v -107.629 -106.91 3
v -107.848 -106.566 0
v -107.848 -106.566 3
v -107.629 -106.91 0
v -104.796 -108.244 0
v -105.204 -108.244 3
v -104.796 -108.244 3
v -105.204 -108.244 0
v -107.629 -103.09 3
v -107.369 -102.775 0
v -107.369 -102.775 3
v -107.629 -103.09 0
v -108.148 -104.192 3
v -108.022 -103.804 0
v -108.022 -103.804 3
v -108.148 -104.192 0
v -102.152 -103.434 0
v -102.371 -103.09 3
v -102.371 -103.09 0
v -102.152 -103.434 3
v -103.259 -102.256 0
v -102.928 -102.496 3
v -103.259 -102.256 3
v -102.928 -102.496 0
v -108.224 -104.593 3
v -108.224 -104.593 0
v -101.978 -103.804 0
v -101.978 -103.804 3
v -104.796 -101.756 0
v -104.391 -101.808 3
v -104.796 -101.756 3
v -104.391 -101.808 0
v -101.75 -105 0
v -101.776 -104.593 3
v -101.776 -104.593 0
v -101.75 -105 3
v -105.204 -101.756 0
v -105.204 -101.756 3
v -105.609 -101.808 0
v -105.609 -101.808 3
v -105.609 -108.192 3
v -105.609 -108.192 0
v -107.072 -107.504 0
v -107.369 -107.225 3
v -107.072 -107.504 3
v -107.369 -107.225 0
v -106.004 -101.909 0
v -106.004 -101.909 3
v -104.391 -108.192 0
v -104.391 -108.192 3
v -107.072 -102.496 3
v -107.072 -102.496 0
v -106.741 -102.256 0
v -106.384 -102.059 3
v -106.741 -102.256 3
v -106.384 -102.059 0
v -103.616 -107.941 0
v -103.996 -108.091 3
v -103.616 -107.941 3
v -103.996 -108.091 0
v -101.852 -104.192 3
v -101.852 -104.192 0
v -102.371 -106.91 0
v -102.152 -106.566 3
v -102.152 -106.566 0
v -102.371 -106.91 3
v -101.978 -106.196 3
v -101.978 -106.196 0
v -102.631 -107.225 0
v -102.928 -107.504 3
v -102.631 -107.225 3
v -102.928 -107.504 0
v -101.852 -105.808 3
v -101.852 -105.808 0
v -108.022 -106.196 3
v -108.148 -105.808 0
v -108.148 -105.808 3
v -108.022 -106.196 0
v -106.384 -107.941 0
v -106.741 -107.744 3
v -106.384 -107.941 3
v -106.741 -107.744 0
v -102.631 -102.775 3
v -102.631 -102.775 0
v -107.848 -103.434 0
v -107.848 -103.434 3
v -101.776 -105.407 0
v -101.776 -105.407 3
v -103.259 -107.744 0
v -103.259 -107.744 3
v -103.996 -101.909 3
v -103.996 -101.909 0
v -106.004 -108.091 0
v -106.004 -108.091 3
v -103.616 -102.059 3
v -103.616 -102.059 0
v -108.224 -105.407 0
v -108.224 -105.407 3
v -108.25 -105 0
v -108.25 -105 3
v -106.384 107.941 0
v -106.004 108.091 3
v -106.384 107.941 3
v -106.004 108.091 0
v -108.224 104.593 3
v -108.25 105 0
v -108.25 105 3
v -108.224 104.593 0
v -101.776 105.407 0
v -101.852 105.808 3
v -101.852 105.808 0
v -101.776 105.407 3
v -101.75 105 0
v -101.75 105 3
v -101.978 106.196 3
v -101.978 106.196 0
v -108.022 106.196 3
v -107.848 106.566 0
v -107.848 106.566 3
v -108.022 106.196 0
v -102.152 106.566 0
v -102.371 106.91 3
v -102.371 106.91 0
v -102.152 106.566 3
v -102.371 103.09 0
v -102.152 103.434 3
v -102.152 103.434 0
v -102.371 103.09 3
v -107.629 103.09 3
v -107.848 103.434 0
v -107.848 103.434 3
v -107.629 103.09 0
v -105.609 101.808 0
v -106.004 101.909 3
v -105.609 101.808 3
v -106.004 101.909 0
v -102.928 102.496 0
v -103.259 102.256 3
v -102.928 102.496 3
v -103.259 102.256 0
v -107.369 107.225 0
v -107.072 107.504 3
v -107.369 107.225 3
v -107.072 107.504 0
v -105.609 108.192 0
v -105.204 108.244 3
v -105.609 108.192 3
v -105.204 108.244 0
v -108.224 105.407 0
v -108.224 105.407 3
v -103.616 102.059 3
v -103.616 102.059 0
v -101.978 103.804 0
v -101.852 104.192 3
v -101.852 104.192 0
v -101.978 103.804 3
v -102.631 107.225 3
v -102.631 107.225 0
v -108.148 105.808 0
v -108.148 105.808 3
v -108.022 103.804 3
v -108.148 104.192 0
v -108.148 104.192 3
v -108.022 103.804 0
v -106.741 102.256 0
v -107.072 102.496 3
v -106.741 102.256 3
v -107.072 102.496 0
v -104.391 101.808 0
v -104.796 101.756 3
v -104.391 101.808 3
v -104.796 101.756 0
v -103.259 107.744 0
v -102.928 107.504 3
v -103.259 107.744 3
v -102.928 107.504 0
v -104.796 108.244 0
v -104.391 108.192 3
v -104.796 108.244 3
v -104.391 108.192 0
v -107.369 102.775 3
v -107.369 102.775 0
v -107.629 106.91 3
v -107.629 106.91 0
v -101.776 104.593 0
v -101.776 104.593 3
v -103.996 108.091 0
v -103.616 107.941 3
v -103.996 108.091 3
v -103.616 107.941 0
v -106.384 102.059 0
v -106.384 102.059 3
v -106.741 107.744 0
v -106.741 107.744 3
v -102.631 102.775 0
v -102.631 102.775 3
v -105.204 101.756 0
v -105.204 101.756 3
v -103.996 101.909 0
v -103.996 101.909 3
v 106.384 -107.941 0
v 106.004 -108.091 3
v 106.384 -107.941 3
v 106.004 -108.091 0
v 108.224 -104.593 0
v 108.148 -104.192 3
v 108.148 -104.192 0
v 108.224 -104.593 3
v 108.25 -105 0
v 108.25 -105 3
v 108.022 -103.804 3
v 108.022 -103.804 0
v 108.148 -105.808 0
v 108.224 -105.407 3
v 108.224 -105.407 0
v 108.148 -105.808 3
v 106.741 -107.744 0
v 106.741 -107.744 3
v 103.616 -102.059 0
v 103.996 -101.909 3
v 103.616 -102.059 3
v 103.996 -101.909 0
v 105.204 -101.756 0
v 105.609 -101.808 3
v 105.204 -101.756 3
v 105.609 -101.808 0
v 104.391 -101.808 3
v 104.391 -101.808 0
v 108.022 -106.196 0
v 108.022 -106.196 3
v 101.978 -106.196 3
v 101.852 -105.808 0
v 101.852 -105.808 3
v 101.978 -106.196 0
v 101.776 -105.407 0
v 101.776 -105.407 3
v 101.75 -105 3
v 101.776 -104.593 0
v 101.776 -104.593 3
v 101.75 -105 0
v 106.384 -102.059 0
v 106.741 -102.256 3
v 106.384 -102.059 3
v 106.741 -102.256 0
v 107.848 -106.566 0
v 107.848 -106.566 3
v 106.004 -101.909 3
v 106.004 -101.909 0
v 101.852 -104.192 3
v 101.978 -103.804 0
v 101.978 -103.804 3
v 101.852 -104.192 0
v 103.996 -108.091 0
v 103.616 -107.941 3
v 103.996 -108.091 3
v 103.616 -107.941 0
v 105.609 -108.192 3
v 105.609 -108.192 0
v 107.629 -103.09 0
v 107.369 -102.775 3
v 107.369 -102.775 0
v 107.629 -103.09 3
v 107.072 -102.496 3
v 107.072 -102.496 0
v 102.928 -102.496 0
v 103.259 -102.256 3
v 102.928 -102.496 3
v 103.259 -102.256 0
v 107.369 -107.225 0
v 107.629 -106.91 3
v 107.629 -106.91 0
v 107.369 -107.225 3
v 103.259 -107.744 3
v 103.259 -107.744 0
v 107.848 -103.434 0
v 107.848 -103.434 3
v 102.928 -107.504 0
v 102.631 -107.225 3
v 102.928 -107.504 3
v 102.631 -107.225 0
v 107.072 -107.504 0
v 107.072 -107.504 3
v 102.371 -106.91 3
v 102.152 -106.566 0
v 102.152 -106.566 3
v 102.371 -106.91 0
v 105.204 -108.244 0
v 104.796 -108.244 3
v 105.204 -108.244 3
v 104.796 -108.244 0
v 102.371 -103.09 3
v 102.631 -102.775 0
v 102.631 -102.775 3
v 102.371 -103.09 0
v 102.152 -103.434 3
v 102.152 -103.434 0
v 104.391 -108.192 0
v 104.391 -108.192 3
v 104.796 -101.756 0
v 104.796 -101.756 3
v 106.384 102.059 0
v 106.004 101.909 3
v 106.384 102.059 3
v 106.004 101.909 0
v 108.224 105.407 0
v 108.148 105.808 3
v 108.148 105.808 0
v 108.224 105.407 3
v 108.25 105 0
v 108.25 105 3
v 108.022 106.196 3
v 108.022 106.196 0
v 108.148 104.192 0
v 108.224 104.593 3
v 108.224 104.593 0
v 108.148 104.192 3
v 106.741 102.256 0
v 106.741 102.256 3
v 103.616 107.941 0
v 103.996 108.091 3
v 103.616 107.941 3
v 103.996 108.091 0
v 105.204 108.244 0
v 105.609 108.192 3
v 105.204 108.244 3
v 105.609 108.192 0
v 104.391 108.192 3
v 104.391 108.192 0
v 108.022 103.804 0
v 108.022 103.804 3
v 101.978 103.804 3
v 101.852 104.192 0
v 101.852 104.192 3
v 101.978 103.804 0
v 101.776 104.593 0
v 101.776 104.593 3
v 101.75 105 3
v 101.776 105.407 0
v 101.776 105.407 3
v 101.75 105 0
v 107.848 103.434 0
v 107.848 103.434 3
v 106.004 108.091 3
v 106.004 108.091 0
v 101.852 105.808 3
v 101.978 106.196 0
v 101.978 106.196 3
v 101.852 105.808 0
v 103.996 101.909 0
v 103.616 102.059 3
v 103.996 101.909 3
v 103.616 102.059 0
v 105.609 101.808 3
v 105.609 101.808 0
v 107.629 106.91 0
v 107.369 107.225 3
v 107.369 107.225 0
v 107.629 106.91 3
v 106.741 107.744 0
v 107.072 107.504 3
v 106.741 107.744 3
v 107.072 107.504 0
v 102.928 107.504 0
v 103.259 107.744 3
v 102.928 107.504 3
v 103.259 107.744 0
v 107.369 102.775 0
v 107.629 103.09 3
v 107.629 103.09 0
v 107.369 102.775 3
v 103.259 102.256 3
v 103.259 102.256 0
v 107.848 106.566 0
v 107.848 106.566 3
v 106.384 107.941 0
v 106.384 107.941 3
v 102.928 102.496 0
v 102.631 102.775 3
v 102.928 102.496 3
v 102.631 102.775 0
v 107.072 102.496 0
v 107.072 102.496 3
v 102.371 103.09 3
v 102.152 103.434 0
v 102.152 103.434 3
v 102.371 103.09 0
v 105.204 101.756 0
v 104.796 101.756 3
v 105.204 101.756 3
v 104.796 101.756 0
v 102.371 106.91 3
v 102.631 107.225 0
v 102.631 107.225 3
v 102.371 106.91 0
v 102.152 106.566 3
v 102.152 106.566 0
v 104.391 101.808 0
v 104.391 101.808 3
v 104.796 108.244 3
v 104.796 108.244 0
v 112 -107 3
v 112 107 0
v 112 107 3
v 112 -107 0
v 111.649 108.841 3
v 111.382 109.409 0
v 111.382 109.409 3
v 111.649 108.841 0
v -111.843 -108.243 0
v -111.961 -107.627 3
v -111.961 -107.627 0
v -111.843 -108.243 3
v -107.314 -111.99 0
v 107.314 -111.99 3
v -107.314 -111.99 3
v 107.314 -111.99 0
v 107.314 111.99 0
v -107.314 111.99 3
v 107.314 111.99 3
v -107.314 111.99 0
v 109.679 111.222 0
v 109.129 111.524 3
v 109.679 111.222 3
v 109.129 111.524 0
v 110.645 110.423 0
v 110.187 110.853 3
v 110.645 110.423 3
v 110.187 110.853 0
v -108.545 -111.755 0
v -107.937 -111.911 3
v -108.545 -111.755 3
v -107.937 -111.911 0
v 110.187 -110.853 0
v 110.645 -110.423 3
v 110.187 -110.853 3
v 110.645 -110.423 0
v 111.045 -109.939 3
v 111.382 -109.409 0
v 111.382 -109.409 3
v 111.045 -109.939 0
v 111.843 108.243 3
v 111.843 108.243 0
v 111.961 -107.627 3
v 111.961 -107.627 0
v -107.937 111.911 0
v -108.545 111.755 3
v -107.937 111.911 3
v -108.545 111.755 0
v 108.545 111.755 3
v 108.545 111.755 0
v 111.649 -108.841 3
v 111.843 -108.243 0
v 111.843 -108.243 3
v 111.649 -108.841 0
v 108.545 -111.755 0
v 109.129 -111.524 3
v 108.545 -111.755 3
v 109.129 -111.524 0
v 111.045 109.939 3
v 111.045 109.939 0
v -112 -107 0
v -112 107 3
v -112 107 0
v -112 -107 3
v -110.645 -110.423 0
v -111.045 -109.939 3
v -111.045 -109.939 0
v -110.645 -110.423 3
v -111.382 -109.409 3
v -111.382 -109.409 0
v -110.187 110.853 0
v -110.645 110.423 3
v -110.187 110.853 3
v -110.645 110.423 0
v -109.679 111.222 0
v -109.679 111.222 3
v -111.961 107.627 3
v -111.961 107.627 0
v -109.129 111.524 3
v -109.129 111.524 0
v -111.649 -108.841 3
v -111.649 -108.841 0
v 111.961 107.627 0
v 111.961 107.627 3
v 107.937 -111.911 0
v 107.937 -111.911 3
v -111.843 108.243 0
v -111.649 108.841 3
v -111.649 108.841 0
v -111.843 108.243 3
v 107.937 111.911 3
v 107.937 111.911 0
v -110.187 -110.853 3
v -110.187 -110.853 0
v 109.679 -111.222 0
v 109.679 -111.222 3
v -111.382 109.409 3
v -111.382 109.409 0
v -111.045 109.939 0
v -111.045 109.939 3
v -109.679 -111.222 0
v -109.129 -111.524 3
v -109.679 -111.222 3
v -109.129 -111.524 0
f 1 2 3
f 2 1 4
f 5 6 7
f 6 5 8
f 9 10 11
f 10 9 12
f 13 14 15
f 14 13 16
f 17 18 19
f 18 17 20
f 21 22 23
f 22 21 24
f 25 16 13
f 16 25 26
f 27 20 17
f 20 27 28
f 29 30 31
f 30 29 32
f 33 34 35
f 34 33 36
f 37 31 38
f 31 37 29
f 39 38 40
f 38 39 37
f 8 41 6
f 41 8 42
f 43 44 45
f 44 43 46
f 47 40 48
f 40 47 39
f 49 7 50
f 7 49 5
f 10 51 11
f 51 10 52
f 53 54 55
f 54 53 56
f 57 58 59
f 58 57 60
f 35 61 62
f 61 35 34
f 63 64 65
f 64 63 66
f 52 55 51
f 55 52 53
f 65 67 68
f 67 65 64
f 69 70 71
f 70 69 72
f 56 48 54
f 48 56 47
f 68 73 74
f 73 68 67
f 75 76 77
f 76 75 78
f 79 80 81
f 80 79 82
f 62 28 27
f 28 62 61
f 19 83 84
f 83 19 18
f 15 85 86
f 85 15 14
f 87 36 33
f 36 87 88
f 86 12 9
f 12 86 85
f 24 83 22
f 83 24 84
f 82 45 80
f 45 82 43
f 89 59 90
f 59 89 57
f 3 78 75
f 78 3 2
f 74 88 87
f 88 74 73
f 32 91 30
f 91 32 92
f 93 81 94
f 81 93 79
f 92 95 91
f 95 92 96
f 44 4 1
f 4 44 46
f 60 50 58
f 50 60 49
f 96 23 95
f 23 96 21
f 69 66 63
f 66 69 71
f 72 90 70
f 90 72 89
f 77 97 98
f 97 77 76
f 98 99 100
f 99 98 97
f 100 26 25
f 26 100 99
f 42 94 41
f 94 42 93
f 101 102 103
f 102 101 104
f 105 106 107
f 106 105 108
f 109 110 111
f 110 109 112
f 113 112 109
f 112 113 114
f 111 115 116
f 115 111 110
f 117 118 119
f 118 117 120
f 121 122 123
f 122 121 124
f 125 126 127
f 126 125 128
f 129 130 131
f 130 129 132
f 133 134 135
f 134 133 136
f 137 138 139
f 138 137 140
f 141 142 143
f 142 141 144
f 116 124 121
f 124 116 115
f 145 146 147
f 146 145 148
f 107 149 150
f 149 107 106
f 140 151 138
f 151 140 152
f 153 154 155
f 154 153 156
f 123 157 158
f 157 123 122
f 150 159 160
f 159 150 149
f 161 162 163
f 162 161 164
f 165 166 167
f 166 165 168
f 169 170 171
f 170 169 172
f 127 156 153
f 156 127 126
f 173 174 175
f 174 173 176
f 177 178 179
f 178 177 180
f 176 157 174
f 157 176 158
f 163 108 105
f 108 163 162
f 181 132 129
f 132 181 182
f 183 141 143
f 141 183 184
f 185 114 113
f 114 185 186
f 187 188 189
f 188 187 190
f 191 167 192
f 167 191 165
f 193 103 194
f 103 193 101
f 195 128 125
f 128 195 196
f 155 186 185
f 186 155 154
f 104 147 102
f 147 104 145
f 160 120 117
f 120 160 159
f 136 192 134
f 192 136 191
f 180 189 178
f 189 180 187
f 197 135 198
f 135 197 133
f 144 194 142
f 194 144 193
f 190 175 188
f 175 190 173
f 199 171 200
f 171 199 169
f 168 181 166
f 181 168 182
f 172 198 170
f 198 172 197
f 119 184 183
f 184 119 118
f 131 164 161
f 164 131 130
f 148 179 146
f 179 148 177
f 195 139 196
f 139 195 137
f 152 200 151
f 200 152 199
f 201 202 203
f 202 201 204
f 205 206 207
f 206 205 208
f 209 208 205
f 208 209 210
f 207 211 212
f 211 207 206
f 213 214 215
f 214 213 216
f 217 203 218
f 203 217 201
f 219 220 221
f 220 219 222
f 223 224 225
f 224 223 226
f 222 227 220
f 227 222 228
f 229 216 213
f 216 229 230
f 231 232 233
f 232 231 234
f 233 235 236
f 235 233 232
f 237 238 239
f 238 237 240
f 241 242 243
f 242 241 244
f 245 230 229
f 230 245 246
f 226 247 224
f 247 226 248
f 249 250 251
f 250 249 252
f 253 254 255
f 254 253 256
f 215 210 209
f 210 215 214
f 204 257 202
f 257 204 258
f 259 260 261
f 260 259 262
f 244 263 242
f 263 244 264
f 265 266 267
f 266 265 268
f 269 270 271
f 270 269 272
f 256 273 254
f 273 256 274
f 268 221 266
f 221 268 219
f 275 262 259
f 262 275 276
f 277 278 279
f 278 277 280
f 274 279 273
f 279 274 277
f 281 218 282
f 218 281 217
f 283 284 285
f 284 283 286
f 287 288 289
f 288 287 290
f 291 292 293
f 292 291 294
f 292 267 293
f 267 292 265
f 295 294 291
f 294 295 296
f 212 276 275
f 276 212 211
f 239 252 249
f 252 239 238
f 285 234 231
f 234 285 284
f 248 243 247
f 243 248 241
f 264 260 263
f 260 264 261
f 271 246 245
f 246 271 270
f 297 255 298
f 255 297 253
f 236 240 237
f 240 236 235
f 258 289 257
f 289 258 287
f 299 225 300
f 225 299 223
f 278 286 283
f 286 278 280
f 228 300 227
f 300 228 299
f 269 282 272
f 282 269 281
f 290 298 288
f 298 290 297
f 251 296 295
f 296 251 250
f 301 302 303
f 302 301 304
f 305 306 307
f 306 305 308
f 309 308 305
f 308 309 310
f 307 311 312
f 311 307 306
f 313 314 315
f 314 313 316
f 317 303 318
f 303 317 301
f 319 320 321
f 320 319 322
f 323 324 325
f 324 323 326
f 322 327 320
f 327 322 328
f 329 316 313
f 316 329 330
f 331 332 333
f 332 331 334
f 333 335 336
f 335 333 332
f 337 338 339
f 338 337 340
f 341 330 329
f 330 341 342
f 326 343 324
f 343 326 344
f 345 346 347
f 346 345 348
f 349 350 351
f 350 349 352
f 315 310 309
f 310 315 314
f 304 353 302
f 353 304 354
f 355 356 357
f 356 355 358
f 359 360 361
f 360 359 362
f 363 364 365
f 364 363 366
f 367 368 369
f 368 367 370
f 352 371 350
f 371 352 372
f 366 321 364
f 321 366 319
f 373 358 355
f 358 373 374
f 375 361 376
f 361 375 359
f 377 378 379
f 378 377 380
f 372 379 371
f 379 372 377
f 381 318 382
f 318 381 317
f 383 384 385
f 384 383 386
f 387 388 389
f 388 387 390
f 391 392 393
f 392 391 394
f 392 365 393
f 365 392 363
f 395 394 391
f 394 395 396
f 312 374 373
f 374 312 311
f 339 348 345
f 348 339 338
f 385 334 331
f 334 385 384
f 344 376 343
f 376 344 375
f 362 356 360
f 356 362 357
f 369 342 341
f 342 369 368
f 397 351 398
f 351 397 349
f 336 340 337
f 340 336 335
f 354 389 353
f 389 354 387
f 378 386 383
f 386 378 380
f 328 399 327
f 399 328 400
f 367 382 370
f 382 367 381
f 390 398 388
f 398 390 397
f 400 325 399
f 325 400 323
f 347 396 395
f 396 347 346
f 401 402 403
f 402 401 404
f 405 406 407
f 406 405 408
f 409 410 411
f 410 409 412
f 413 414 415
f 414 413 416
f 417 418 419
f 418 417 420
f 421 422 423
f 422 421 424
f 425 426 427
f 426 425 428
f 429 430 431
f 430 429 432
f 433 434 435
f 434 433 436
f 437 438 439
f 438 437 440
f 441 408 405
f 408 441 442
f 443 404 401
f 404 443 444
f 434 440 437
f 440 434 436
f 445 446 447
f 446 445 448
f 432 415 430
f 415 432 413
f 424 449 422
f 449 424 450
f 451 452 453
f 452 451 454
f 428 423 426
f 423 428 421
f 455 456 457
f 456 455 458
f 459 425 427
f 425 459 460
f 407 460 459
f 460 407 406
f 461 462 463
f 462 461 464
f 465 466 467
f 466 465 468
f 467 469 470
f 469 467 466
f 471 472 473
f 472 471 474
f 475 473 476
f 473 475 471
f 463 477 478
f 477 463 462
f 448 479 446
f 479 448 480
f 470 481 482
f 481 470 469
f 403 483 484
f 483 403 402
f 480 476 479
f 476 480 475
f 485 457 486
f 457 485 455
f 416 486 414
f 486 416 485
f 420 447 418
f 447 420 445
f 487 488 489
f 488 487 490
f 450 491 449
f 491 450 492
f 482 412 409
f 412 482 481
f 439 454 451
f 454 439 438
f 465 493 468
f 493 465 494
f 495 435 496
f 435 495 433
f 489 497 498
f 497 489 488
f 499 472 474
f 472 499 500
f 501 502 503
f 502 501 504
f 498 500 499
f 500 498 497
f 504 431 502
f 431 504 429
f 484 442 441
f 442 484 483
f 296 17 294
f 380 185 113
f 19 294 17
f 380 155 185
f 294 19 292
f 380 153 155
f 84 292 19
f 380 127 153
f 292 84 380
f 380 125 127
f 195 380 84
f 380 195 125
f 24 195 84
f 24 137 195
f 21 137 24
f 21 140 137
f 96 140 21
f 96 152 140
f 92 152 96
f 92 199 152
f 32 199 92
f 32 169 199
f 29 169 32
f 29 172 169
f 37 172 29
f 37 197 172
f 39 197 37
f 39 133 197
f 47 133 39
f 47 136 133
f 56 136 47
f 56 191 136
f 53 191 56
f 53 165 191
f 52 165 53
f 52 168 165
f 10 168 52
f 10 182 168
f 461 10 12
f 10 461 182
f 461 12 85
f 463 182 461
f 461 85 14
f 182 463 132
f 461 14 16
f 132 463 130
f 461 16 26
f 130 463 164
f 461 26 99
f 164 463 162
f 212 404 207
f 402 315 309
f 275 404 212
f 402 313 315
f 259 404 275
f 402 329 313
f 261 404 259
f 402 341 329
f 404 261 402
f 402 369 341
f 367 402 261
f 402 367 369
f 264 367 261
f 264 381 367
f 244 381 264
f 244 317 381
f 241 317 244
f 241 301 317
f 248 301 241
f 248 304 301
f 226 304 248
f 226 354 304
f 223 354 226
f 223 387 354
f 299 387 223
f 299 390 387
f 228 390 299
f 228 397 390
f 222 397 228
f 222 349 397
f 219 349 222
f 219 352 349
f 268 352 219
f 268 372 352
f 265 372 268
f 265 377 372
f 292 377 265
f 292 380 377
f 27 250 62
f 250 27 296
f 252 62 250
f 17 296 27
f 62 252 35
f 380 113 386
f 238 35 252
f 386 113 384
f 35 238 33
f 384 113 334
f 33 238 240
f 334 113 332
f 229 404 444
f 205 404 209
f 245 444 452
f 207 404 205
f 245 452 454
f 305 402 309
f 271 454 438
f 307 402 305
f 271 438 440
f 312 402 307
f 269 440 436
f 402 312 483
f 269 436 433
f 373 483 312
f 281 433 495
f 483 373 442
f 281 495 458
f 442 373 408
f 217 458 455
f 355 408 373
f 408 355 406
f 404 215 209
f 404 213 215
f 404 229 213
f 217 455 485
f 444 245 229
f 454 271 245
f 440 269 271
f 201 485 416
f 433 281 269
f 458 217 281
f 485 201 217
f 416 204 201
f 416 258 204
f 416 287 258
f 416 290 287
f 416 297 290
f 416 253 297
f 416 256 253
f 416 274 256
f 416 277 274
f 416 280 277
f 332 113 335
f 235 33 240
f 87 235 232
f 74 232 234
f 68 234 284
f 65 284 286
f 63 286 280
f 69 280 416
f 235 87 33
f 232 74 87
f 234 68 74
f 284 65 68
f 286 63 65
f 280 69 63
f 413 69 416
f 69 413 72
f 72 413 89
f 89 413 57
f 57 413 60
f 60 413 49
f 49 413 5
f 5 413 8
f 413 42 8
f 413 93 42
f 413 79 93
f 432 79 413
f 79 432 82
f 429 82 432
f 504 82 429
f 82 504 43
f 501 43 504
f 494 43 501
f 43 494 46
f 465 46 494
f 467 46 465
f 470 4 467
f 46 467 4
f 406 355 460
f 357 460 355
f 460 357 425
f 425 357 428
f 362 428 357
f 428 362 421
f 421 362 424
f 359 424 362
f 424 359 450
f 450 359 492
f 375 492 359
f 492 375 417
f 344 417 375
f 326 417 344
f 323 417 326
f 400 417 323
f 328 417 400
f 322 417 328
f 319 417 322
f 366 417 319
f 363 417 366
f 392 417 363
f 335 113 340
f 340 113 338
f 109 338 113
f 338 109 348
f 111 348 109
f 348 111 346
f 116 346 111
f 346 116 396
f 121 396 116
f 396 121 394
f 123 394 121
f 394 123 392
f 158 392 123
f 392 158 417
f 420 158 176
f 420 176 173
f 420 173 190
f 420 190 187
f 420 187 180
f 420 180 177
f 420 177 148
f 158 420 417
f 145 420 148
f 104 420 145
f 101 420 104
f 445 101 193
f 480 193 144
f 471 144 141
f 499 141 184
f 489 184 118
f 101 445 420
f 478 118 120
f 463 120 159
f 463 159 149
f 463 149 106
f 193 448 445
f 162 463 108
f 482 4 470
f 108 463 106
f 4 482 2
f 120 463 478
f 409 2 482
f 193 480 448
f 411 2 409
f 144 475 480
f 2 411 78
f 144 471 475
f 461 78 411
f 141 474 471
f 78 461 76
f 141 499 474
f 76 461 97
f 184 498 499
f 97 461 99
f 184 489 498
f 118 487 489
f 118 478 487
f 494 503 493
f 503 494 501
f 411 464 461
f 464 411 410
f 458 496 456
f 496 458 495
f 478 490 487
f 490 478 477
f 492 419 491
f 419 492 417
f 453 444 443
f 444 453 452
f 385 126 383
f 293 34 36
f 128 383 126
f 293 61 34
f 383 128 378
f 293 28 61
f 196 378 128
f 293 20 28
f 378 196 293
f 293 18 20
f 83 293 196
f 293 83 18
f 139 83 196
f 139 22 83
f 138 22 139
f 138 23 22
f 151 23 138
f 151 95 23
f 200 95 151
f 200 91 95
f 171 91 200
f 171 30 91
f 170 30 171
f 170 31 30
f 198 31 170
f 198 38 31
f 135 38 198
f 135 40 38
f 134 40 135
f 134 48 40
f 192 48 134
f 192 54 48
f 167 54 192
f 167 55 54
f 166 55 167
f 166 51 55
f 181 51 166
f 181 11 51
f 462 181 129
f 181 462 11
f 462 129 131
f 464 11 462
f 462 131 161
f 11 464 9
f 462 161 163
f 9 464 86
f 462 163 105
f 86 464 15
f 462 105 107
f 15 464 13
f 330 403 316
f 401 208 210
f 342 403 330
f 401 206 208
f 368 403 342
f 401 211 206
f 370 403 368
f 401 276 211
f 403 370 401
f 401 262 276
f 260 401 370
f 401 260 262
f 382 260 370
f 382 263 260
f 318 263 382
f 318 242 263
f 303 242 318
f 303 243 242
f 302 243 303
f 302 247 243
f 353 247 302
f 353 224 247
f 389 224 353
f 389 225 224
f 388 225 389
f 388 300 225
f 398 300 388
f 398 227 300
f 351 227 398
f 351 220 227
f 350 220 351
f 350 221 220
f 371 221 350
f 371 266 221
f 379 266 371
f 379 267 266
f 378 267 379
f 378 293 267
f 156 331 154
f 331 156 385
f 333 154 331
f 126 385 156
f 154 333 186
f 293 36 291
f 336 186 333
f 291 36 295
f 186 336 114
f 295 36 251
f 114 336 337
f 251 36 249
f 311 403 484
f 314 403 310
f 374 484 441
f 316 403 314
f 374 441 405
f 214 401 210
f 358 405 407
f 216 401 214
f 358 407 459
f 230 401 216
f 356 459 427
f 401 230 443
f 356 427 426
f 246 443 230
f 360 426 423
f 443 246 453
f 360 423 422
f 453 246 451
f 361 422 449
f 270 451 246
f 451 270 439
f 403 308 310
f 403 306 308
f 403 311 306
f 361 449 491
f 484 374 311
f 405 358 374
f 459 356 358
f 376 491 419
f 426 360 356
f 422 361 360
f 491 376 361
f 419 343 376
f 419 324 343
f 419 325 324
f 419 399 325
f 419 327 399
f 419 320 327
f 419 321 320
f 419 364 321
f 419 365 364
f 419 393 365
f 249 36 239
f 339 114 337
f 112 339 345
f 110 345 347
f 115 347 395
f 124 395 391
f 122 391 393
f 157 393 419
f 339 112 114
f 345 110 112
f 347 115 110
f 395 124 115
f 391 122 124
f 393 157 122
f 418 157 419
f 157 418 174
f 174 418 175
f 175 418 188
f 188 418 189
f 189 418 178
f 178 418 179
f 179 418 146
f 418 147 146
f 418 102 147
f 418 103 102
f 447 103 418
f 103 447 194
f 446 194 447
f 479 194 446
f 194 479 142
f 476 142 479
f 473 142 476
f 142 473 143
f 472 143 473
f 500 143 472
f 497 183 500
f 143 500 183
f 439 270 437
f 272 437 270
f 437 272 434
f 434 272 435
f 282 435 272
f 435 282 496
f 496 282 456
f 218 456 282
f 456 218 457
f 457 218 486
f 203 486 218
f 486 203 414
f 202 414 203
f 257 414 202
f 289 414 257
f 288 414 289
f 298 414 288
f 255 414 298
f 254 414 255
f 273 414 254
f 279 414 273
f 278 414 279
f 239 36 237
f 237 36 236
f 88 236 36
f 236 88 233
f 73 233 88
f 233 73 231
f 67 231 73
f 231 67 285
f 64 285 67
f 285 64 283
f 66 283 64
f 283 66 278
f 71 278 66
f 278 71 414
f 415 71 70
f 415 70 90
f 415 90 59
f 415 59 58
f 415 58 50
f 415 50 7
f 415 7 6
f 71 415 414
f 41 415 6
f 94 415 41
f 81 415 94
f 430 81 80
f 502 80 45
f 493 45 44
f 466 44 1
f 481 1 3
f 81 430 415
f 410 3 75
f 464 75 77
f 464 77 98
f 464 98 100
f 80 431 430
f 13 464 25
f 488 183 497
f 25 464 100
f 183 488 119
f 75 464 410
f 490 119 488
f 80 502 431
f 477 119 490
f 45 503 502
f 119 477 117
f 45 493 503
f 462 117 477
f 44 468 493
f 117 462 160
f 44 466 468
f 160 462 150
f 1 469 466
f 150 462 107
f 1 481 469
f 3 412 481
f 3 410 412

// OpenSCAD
$fn = 50;


difference() {
	union() {
		hull() {
			translate(v = [-107.0000000000, 107.0000000000, 0]) {
				cylinder(h = 3, r = 5);
			}
			translate(v = [107.0000000000, 107.0000000000, 0]) {
				cylinder(h = 3, r = 5);
			}
			translate(v = [-107.0000000000, -107.0000000000, 0]) {
				cylinder(h = 3, r = 5);
			}
			translate(v = [107.0000000000, -107.0000000000, 0]) {
				cylinder(h = 3, r = 5);
			}
		}
	}
	union() {
		translate(v = [-105.0000000000, -105.0000000000, -100.0000000000]) {
			cylinder(h = 200, r = 3.2500000000);
		}
		translate(v = [-105.0000000000, 105.0000000000, -100.0000000000]) {
			cylinder(h = 200, r = 3.2500000000);
		}
		translate(v = [105.0000000000, -105.0000000000, -100.0000000000]) {
			cylinder(h = 200, r = 3.2500000000);
		}
		translate(v = [105.0000000000, 105.0000000000, -100.0000000000]) {
			cylinder(h = 200, r = 3.2500000000);
		}
	}
}
